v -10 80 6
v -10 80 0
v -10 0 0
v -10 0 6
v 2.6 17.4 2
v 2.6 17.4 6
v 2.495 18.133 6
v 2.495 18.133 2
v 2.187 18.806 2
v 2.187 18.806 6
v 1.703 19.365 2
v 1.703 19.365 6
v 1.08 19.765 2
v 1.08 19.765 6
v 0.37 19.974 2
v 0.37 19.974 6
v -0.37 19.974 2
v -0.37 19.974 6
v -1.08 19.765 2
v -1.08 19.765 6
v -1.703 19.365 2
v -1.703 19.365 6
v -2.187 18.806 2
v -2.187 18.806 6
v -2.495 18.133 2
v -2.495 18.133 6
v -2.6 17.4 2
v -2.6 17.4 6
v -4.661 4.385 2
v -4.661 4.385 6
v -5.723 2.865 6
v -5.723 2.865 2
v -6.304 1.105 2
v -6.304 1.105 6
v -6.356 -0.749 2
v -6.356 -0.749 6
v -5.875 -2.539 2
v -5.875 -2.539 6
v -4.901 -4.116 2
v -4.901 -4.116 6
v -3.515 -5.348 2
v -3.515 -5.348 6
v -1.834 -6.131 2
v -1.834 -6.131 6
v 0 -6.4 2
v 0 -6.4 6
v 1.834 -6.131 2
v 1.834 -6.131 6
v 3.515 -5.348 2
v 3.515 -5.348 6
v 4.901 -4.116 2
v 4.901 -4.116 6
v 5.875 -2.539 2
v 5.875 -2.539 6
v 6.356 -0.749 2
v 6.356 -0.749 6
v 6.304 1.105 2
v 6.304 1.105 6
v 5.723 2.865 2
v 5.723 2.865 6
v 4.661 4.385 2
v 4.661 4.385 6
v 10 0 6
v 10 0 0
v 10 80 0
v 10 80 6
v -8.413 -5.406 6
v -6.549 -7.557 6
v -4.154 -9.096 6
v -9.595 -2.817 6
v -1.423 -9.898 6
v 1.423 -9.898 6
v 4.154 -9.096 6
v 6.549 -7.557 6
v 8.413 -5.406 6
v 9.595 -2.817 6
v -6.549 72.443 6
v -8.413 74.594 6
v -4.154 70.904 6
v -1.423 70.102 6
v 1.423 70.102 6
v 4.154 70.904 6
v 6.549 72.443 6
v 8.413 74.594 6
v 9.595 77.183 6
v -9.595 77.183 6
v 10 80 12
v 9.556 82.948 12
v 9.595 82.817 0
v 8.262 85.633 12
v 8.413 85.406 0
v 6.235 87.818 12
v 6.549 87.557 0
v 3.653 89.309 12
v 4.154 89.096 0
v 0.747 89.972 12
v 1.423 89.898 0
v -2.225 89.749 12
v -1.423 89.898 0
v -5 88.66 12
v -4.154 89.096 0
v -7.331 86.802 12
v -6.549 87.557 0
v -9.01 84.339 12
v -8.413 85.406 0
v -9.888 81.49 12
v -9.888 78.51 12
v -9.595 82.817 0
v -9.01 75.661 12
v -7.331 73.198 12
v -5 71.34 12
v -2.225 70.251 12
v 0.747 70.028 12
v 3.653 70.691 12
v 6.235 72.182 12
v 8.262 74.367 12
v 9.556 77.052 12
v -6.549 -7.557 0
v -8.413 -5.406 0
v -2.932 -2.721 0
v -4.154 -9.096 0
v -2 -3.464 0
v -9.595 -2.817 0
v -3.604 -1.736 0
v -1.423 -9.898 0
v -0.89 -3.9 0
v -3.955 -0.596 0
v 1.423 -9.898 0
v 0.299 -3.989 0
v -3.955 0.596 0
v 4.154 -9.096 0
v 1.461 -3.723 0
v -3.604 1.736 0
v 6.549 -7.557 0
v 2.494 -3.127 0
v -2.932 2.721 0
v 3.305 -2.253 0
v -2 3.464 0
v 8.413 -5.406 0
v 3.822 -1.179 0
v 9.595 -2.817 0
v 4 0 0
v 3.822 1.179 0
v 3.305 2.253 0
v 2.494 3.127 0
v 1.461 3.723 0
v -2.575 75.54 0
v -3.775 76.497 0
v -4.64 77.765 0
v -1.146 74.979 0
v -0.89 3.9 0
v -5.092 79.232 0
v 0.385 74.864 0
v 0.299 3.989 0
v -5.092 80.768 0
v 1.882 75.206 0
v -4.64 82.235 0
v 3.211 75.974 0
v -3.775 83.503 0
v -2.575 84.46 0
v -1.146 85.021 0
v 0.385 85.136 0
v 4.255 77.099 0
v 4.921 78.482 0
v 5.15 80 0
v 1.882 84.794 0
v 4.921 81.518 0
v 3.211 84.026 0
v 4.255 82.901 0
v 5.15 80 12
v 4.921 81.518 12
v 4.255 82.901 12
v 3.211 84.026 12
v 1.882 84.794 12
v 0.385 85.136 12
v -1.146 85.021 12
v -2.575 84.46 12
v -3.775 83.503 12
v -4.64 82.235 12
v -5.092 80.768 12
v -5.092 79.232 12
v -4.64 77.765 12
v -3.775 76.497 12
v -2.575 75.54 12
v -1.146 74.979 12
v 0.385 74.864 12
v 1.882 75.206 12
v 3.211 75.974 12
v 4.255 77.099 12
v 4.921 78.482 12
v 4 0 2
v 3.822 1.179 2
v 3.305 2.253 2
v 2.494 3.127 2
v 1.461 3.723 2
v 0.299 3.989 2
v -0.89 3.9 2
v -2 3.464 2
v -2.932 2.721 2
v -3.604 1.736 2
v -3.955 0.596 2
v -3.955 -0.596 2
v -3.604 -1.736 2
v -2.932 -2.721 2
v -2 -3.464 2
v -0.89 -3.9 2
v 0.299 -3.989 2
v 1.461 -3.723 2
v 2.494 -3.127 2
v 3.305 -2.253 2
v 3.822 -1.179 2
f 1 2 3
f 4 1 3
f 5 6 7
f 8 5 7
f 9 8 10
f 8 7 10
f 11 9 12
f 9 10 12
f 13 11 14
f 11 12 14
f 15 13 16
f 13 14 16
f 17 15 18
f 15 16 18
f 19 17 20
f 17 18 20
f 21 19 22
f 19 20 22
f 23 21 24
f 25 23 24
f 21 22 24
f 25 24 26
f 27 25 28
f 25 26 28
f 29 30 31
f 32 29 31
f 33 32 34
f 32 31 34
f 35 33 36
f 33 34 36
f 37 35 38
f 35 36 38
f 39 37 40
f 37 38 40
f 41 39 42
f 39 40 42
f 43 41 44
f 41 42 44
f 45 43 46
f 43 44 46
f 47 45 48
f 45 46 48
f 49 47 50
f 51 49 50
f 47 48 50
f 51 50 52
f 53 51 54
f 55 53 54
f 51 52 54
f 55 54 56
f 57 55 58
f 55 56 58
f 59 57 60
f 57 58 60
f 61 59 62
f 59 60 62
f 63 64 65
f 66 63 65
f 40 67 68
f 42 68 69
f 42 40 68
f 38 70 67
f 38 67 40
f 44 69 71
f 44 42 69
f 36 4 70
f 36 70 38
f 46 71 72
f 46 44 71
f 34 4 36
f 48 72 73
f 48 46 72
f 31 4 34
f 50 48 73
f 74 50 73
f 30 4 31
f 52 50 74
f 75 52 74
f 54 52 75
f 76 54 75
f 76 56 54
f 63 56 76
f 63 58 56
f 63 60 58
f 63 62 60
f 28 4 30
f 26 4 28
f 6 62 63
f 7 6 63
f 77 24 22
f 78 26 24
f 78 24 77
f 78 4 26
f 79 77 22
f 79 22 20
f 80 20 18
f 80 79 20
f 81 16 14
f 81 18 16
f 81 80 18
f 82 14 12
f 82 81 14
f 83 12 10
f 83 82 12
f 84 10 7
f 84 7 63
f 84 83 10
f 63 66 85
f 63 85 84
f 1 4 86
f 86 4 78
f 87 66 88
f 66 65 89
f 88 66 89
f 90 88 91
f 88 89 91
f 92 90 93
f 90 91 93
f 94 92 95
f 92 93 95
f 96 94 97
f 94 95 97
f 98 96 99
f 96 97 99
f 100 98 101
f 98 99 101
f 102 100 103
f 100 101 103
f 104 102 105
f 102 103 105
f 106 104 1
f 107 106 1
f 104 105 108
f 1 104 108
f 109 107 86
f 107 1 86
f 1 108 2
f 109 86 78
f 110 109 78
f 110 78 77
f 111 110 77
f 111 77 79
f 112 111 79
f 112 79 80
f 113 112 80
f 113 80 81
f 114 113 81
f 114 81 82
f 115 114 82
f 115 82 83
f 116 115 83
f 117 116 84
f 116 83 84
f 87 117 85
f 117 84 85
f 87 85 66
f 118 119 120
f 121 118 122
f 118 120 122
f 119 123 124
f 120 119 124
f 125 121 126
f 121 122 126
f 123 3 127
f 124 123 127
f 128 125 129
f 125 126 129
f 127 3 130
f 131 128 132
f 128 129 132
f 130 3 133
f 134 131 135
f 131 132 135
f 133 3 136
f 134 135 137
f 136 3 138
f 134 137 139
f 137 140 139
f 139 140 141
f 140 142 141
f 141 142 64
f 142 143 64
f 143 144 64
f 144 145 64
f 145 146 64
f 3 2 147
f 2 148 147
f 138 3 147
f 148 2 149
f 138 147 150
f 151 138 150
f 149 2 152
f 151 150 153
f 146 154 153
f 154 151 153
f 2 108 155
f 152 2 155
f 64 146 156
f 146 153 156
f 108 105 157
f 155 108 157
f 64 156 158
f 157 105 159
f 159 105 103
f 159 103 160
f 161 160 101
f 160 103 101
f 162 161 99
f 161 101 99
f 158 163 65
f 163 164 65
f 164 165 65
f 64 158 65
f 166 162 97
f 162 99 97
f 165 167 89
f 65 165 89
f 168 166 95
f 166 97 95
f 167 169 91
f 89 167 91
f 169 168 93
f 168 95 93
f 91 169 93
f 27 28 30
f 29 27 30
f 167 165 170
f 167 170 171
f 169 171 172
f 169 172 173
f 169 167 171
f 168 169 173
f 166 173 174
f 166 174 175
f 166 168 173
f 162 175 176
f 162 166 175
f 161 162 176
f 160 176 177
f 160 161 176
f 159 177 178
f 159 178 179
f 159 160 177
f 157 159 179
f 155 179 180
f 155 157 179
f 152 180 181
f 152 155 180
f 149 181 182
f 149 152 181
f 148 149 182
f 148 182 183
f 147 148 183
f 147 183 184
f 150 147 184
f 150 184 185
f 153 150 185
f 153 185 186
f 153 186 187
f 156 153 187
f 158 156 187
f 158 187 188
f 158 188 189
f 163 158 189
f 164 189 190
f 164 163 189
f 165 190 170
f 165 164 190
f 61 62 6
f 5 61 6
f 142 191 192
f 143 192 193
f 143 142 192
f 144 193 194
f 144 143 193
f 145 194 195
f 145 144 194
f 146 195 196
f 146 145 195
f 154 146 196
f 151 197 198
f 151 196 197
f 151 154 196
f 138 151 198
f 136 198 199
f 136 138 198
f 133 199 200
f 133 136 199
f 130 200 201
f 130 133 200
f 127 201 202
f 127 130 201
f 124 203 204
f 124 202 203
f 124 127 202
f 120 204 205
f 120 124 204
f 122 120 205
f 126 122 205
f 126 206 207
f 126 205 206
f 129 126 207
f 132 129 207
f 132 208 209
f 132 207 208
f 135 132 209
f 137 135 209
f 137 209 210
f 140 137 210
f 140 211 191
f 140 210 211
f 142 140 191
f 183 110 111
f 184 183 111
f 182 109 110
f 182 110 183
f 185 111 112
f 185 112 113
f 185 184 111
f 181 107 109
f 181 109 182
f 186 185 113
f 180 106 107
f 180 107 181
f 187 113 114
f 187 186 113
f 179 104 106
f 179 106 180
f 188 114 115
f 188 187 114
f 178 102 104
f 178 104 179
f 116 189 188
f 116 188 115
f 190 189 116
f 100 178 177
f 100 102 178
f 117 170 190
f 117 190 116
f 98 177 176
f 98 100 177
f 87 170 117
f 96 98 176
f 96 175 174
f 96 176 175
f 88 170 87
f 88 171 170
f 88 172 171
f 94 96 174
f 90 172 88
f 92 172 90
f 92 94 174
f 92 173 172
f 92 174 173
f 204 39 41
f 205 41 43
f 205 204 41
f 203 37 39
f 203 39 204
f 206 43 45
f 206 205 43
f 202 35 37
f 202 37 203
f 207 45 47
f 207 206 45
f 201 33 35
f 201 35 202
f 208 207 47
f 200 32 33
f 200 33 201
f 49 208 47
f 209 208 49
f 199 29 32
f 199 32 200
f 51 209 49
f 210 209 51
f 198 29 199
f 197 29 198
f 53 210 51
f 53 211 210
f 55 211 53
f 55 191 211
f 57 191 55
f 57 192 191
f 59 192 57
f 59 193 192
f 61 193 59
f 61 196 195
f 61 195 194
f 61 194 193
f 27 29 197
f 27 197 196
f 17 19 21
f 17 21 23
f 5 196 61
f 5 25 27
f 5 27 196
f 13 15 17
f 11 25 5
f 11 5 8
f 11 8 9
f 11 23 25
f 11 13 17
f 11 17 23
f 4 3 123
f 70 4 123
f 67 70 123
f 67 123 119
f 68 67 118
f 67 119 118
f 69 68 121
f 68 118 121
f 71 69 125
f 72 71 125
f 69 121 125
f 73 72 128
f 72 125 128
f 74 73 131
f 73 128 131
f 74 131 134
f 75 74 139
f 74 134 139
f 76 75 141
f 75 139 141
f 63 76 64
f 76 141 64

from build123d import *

# Parameters (mm, degrees)
SKETCH_1_R          = 4
EXTRUDE_1_DEPTH     = 6
SKETCH_1_3_R        = 5.15
EXTRUDE_2_DEPTH     = 12
CUT_EXTRUDE_1_DEPTH = 4


with BuildPart() as part:
    # Эскиз1 → Бобышка-Вытянуть1 (new body)
    with BuildSketch(Plane.XY):
        with BuildLine():
            ThreePointArc((-10, 0), (0, -10), (10, 0))
            Line((10, 0), (10, 80))
            ThreePointArc((10, 80), (0, 70), (-10, 80))
            Line((-10, 80), (-10, 0))
        make_face()
        Circle(SKETCH_1_R, mode=Mode.SUBTRACT)
    extrude(amount=EXTRUDE_1_DEPTH)

    # Эскиз1<3> → Бобышка-Вытянуть2 (add)
    with BuildSketch(Plane.XY):
        with BuildLine():
            ThreePointArc((10, 80), (0, 90), (-10, 80))
            ThreePointArc((-10, 80), (0, 70), (10, 80))
        make_face()
        with Locations((0, 80)):
            Circle(SKETCH_1_3_R, mode=Mode.SUBTRACT)
    extrude(amount=EXTRUDE_2_DEPTH)

    # Эскиз2 → Вырез-Вытянуть1 (cut)
    with BuildSketch(Plane.XY.offset(6)):
        with BuildLine():
            Line((4.661300265, 4.385462329), (2.6, 17.4))
            ThreePointArc((2.6, 17.4), (0, 20), (-2.6, 17.4))
            Line((-2.6, 17.4), (-4.661300265, 4.385462329))
            ThreePointArc((-4.661300265, 4.385462329), (0, -6.4), (4.661300265, 4.385462329))
        make_face()
    extrude(amount=-CUT_EXTRUDE_1_DEPTH, mode=Mode.SUBTRACT)


solid = part.part
